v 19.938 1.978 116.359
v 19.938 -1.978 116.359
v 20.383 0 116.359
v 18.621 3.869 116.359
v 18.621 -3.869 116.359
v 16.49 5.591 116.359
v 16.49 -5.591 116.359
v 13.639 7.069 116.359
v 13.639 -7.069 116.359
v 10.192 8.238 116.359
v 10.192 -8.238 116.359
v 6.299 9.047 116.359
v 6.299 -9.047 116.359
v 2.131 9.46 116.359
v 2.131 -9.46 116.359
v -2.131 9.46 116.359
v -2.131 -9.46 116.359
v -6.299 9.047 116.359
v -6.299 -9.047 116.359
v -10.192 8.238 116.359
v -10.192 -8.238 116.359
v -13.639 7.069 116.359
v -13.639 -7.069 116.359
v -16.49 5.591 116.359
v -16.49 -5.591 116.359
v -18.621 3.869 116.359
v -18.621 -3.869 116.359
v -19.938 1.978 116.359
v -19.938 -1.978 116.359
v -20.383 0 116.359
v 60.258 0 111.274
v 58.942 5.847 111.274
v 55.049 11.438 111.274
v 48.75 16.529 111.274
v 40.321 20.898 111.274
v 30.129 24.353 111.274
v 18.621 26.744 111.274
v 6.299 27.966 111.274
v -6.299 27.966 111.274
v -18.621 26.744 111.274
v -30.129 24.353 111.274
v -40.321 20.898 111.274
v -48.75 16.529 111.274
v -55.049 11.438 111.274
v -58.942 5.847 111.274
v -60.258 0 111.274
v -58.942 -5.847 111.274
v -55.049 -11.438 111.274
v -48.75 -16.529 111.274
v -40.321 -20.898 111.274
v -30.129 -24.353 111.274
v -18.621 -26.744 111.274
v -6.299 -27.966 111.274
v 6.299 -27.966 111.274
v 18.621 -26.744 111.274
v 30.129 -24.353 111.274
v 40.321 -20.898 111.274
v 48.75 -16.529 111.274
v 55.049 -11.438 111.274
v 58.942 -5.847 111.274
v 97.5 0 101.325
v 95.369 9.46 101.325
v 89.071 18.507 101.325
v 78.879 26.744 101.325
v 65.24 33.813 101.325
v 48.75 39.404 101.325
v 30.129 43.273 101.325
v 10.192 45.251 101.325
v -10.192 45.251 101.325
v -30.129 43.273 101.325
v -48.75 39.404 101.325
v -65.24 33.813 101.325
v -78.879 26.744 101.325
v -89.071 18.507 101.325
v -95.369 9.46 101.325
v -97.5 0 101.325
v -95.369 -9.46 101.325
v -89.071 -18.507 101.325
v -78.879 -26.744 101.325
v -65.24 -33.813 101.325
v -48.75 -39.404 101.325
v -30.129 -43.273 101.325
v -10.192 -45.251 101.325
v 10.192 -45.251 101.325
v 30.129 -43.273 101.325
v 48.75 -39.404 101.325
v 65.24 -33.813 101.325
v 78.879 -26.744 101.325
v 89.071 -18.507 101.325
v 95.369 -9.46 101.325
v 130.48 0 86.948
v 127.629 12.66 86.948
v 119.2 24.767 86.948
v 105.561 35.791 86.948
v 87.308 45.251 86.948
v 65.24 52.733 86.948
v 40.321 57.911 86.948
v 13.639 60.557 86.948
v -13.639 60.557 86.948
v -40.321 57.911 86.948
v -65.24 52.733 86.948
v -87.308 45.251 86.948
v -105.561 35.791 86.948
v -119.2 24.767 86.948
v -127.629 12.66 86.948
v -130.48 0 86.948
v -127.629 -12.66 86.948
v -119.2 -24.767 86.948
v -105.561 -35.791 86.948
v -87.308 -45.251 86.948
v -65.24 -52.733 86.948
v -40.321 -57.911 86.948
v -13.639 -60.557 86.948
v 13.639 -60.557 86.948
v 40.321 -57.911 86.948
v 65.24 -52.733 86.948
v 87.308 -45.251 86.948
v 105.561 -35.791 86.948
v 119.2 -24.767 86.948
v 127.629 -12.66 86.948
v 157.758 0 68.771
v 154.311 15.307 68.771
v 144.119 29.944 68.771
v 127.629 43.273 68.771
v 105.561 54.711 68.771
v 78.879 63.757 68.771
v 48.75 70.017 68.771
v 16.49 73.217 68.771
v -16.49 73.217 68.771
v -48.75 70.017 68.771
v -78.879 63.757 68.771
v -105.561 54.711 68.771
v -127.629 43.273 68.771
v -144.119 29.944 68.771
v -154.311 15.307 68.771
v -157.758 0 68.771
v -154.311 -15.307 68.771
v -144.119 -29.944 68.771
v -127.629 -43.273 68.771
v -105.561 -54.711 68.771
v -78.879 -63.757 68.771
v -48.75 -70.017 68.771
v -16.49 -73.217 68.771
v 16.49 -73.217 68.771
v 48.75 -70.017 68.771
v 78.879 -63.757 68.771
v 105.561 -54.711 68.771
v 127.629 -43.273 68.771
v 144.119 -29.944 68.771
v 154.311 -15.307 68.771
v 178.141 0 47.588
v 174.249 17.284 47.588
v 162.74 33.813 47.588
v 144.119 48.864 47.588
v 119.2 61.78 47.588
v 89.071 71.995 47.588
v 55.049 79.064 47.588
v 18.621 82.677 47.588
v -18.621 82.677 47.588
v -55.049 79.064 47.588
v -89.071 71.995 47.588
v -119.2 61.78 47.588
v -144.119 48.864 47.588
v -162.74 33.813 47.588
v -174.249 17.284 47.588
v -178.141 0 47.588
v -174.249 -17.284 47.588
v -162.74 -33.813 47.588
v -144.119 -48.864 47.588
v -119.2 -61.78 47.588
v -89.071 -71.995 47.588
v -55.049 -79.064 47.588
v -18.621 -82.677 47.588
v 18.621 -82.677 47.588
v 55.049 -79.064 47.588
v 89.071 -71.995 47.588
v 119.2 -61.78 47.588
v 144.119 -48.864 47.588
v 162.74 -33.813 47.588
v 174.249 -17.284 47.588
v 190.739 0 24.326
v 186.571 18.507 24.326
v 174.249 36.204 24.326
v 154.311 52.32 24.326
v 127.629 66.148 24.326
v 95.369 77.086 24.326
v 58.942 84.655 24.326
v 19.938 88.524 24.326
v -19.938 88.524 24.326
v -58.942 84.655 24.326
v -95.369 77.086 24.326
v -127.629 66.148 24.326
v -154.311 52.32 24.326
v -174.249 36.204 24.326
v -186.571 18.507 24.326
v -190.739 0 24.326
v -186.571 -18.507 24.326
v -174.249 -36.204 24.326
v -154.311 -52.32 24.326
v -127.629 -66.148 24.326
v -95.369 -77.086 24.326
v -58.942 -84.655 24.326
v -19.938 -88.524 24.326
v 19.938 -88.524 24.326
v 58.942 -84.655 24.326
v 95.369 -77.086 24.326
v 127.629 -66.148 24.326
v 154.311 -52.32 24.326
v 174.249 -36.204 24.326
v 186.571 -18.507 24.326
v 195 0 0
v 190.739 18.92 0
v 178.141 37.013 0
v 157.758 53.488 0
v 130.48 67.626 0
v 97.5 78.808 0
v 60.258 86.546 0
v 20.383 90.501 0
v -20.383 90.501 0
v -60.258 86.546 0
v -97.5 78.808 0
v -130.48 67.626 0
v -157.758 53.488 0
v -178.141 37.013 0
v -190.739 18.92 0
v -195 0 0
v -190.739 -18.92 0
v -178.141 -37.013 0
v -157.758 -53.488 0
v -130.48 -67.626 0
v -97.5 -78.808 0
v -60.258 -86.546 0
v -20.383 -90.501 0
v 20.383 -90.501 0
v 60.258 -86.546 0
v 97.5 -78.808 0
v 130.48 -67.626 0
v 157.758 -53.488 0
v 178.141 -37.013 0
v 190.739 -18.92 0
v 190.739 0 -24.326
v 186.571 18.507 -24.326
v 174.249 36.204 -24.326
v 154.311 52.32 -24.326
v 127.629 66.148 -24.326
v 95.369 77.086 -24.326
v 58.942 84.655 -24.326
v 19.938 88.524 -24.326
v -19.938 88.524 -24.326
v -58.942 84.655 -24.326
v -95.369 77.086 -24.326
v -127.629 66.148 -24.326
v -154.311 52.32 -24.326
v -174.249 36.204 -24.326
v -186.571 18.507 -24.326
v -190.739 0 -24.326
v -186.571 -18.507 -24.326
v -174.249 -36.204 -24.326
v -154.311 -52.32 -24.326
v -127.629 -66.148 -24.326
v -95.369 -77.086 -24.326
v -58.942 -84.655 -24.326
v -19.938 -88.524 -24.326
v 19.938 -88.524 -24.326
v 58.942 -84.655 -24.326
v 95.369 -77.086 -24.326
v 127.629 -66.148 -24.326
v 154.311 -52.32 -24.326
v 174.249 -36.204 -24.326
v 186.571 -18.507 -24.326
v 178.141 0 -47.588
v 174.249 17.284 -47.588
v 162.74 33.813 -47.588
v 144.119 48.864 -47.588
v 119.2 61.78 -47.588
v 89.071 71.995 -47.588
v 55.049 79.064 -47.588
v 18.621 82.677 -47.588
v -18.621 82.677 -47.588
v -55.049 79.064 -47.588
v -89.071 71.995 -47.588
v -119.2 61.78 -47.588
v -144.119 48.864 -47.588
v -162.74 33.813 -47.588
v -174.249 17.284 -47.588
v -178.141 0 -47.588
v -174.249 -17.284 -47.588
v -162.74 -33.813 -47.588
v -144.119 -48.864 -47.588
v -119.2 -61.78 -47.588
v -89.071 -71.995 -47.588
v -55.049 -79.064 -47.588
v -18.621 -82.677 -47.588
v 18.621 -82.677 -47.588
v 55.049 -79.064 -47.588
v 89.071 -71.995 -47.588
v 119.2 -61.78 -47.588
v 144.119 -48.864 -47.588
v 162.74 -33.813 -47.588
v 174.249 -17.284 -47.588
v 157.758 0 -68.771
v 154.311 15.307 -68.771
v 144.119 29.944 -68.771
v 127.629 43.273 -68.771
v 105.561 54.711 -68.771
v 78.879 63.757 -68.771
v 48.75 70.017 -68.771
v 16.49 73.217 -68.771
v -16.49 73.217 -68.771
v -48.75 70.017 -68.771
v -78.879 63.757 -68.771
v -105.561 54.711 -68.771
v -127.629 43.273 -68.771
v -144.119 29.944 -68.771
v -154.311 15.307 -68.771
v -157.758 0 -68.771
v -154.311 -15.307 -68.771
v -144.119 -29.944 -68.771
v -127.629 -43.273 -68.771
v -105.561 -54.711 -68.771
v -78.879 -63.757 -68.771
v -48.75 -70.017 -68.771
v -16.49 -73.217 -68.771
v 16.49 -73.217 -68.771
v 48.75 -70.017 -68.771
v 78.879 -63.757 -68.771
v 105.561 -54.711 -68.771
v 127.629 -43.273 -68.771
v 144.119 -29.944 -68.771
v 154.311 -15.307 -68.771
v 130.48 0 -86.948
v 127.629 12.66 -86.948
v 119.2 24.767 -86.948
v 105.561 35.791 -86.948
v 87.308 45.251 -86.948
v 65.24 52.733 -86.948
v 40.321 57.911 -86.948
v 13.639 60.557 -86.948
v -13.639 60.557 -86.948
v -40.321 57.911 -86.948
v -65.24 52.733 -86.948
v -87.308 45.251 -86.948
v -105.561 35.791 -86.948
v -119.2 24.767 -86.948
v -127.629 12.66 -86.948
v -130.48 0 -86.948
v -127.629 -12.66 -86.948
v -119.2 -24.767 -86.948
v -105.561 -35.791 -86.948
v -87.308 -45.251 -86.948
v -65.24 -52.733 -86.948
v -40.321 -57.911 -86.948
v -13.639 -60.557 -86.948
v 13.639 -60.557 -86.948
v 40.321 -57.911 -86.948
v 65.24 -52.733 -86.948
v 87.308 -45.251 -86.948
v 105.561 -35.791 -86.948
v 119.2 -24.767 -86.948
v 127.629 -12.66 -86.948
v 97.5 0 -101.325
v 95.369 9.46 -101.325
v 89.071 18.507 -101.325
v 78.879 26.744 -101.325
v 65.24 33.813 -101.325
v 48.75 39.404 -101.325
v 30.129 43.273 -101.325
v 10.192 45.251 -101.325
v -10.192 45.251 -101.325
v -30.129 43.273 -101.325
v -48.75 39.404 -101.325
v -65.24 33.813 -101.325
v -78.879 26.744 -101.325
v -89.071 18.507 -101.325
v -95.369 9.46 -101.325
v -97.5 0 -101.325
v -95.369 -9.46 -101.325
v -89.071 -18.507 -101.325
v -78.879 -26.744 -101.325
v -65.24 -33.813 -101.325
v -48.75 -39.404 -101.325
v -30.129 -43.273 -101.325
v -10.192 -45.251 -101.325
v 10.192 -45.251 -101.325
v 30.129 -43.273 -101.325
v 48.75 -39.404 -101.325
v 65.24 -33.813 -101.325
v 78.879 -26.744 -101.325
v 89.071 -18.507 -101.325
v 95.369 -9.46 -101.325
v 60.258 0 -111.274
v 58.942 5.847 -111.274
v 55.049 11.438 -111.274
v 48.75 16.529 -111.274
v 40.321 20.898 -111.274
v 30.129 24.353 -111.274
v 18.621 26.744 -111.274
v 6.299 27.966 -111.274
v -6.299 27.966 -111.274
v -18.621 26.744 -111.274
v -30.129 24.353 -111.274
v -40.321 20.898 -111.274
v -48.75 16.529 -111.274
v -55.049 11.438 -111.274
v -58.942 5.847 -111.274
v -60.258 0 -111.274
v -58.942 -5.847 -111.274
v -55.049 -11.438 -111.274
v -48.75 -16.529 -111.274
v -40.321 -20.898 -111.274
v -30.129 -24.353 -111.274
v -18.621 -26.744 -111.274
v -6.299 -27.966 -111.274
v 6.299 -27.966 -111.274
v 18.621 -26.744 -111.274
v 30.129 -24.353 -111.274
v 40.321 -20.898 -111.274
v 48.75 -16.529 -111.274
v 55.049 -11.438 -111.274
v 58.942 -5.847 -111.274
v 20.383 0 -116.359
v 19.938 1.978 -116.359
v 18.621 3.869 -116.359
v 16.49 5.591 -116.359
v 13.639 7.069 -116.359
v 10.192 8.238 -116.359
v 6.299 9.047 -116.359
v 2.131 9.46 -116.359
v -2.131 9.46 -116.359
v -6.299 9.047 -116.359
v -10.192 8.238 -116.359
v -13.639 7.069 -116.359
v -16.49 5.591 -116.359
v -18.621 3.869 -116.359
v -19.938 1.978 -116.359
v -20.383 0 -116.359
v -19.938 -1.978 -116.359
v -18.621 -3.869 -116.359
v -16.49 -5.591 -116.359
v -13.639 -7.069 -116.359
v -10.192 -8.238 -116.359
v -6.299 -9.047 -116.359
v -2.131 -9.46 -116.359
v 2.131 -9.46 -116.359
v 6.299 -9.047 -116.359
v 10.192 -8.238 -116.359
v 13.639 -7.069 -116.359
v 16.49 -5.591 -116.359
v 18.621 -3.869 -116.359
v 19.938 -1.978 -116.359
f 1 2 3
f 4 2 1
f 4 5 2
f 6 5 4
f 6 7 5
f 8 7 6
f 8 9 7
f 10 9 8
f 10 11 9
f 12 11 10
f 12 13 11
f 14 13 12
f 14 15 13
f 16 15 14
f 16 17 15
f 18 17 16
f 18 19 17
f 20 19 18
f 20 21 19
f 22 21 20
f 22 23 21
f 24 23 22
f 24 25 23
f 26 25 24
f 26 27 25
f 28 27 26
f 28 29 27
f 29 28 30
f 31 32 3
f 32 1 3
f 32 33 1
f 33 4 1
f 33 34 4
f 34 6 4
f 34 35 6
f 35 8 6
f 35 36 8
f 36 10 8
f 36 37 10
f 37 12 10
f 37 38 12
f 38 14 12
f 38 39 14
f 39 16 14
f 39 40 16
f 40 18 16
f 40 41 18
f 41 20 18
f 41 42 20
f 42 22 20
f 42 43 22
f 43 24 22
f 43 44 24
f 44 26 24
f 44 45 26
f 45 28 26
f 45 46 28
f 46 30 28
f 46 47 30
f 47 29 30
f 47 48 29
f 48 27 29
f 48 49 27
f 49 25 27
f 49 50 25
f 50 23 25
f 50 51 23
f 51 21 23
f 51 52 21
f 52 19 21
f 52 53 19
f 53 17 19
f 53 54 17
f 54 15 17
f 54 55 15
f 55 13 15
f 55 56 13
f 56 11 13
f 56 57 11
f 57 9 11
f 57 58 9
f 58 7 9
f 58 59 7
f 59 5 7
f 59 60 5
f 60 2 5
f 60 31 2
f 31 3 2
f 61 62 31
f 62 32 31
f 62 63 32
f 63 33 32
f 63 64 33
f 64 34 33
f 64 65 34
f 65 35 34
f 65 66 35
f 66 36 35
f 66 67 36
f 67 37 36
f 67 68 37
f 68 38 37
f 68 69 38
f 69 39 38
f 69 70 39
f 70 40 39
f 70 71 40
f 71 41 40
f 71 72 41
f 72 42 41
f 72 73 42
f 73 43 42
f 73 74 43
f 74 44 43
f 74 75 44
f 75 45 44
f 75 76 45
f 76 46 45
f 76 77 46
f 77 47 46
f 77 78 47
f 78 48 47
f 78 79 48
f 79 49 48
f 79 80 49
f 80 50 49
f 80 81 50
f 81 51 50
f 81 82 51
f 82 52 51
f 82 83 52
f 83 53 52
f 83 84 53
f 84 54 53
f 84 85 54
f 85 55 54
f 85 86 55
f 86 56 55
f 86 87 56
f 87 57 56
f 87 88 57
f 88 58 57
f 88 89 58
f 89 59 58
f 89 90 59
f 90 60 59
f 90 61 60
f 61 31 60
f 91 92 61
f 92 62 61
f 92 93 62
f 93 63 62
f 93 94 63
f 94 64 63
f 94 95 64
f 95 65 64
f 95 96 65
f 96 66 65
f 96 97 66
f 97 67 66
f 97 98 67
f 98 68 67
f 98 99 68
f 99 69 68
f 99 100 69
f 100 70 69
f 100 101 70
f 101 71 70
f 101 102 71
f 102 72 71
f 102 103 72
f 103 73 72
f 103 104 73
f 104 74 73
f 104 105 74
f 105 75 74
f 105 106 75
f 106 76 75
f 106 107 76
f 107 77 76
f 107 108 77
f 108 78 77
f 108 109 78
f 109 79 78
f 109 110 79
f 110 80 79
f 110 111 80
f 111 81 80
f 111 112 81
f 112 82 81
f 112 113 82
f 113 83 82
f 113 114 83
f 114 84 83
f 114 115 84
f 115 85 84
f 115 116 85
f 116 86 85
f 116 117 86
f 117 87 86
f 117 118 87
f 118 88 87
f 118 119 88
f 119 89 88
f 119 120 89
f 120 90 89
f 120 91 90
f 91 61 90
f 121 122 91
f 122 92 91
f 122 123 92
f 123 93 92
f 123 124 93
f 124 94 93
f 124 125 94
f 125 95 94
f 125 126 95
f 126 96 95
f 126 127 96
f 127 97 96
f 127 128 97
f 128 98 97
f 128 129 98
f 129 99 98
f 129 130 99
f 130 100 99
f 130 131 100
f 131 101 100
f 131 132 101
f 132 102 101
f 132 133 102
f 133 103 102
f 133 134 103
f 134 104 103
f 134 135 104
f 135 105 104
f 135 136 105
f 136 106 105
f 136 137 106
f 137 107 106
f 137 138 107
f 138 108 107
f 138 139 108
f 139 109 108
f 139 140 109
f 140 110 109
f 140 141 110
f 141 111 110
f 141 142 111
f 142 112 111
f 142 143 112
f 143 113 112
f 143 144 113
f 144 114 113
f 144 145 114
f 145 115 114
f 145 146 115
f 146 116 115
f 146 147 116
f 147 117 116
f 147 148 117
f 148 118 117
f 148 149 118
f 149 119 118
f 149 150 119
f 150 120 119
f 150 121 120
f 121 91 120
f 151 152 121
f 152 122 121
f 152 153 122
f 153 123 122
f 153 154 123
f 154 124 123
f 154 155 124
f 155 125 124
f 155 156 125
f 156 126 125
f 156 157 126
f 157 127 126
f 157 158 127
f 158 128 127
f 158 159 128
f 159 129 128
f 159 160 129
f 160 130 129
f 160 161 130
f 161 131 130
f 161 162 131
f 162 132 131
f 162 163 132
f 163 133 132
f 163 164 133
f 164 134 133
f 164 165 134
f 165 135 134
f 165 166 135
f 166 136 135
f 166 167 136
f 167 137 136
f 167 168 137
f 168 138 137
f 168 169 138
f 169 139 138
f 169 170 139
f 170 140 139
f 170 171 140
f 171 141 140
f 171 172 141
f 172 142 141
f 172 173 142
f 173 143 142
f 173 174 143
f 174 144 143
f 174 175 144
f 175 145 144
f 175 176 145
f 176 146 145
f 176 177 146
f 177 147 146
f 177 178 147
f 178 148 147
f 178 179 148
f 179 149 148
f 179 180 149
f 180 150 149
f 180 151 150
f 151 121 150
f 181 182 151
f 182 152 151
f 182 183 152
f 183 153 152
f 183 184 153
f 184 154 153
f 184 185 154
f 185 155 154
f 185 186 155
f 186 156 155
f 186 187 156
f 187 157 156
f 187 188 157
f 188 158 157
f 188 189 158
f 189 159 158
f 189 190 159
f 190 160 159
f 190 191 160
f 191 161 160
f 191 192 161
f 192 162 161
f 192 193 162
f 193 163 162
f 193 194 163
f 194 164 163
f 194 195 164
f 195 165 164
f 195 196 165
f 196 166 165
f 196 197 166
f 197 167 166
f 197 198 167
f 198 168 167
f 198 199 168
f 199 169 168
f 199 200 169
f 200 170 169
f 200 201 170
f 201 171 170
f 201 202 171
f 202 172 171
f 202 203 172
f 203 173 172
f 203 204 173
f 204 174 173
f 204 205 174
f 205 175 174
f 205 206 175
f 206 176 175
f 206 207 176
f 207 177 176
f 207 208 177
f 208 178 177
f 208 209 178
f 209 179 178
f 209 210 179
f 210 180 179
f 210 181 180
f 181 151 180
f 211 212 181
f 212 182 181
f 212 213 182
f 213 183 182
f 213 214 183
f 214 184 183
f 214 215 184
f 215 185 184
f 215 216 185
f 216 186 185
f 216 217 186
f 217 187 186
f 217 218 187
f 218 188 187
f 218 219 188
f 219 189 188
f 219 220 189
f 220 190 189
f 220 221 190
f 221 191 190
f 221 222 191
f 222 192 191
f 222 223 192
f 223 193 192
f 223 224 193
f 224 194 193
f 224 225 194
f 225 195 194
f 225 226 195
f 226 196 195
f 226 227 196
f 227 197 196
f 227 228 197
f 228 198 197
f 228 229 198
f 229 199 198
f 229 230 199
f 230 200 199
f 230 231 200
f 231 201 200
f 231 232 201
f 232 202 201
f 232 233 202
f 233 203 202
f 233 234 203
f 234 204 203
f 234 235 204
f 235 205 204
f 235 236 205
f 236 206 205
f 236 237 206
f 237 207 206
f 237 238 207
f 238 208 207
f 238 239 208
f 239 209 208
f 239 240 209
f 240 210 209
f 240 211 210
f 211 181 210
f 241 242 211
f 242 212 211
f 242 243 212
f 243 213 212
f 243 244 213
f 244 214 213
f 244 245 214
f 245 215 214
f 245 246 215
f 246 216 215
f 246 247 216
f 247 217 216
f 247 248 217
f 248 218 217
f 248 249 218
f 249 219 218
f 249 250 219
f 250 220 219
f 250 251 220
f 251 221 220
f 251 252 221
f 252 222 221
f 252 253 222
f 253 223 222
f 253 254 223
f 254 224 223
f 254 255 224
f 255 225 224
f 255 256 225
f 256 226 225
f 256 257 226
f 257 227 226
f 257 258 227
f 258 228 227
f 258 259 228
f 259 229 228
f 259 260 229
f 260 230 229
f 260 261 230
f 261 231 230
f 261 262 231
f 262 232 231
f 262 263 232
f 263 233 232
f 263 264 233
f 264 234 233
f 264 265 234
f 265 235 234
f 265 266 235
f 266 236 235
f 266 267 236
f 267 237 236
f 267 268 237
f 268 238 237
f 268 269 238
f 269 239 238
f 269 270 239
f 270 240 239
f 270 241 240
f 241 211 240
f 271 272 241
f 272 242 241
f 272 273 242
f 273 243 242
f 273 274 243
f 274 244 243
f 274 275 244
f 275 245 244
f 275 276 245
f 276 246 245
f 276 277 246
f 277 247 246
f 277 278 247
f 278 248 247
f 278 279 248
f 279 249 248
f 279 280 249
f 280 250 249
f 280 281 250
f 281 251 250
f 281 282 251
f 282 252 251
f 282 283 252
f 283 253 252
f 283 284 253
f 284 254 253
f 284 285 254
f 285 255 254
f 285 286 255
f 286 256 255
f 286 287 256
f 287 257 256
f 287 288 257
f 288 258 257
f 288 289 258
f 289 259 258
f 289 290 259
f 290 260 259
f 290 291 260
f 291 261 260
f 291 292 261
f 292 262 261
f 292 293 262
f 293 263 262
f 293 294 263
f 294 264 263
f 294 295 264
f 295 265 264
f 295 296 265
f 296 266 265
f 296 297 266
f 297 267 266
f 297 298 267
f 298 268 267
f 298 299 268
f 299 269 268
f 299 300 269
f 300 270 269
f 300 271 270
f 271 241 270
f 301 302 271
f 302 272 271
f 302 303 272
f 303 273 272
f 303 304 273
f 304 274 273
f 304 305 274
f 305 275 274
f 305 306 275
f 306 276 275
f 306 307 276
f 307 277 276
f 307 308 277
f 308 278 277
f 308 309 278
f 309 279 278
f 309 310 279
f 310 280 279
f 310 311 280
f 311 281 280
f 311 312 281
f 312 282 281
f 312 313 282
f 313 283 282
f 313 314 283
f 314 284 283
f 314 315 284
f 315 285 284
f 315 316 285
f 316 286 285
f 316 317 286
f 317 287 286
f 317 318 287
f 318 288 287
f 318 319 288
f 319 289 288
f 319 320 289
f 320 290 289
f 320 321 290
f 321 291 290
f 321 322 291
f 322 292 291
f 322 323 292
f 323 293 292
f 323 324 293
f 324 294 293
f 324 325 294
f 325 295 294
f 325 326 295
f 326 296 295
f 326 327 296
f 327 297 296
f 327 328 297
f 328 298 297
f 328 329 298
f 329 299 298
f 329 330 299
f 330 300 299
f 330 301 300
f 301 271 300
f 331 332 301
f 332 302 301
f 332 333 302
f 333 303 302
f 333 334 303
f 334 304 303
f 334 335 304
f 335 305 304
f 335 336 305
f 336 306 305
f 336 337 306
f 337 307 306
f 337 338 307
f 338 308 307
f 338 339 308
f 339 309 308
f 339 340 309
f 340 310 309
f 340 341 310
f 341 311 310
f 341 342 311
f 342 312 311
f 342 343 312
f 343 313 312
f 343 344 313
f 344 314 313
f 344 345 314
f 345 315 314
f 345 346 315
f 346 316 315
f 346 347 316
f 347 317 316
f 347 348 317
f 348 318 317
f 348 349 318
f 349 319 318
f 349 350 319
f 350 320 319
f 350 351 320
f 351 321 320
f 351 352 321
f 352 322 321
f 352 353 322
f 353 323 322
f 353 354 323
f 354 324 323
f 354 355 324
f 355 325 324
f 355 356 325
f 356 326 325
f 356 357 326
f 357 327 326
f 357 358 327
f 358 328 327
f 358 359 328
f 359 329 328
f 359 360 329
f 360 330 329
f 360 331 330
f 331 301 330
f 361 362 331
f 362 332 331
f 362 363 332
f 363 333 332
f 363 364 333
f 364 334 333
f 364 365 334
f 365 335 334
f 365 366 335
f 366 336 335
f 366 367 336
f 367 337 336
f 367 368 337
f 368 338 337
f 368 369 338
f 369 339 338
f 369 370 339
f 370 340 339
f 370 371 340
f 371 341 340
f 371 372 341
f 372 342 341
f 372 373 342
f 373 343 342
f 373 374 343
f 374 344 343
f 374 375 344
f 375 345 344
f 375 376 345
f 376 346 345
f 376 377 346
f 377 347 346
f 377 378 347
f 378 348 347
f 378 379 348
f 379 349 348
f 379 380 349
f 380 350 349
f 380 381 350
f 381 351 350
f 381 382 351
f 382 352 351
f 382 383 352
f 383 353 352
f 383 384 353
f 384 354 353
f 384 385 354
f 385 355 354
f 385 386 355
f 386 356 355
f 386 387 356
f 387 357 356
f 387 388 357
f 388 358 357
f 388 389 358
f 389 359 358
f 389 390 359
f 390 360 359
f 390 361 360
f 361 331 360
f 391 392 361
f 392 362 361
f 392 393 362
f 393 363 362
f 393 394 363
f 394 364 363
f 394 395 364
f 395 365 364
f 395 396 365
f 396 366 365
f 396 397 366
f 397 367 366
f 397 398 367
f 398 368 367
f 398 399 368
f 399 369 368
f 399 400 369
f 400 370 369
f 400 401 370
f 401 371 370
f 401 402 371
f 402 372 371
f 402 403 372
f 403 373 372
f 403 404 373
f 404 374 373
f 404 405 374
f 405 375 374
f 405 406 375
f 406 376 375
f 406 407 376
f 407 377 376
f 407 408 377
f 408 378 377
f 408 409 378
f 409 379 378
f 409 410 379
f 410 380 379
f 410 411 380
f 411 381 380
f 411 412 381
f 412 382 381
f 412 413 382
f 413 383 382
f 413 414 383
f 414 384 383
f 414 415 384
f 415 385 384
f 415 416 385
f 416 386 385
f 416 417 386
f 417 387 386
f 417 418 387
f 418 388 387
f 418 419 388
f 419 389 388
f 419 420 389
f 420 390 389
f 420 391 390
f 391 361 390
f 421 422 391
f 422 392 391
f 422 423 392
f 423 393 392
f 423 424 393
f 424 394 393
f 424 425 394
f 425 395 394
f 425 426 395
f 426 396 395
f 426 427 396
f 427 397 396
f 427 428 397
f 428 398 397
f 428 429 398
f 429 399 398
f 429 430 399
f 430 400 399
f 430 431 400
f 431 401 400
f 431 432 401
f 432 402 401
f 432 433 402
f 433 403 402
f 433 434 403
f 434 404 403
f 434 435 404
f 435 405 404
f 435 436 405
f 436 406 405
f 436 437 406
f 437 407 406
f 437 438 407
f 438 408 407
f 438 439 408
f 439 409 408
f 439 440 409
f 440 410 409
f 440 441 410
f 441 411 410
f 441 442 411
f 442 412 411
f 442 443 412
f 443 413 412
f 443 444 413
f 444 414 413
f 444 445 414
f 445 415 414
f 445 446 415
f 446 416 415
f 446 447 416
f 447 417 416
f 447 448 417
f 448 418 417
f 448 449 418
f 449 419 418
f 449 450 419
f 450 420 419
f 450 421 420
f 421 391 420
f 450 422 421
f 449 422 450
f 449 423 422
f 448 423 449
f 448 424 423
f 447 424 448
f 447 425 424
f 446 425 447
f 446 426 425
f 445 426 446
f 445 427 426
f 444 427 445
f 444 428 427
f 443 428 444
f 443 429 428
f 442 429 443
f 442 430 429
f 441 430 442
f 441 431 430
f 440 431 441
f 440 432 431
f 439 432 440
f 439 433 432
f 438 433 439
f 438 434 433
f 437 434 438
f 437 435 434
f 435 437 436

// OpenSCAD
// Generated by SolidPython 1.0.1 on 2020-07-29 00:46:51


scale(v = [15, 7, 9]) {
	sphere(r = 13);
}
/***********************************************
*********      SolidPython code:      **********
************************************************
 
# import packages: SolidPython
from solid import *
from solid.utils import *
from itertools import chain, combinations, permutations


class Resize:

    def __init__(self, scad_file):
        self.scad_file = scad_file
        #self.scad_file = import_scad(scad_file)
        # cone/cylinder param:
        self.r1 = 0
        self.r2 = 0
        self.h = 0
        # rectangular prism param:
        self.w = 0
        self.l = 0
        # ellipse param:
        self.r = 0

    # import OpenScad code (file name corresponds to shape)


    # classify shape + parameters
    def assign(self, param1, param2, param3):
        if self.scad_file == 'cone.scad':
            self.r1 = param1
            self.r2 = param2
            self.h = param3
        elif self.scad_file == 'cylinder.scad':
            self.r1 = param1
            self.r2 = param2
            self.h = param3
        elif self.scad_file == 'rectangularPrism.scad':
            self.h = param1
            self.l = param2
            self.w = param3
        else:
            self.r = param1
            self.h = param2

    # resize parameters
    def iterate(self):
        x = range(3, 20, 2)
        i = 1
        if self.scad_file == 'cone.scad':
            tempList = list(permutations(x, 2))
            for temp in tempList:
                param1 = temp[0]
                param2 = temp[1]
                filepath = 'produced_scad_files/' + 'cone' + str(param1) + '_' + str(param2) + '_' + '.scad'
                scad_render_to_file(cylinder(h=param1, r1=param2, r2=0), filepath)

        elif self.scad_file == 'cylinder.scad':
            tempList = list(permutations(x, 3))
            for temp in tempList:
                param1 = temp[0]
                param2 = temp[1]
                filepath = 'produced_scad_files/' + 'cylinder' + str(param1) + '_' + str(param2) + '_' + '.scad'
                scad_render_to_file(cylinder(h=param1, r1=param2, r2=param2), filepath)

        elif self.scad_file == 'rectangularPrism.scad':
            tempList = list(permutations(x, 3))
            for temp in tempList:
                param1 = temp[0]
                param2 = temp[1]
                param3 = temp[2]
                filepath = 'produced_scad_files/' + 'rectangularPrism' + str(param1) + '_' + str(param2) + '_' + str(
                    param3) + '.scad'
                scad_render_to_file(cube(size=(param1, param2, param3)), filepath)

        elif self.scad_file == 'ellipse.scad':
            tempList = list(permutations(x, 4))
            for temp in tempList:
                param1 = temp[0]
                param2 = temp[1]
                param3 = temp[2]
                param4 = temp[3]
                filepath = 'produced_scad_files/' + 'ellipse' + str(param1) + '_' + str(param2) + '_' + str(param3) + '_' + str(param4) + '.scad'
                scad_render_to_file(scale([param1, param2, param3])(sphere(r=param4)), filepath)

    def render_to_scadfile(self):
        scad_render_to_file(scad, 'example.scad') 
 
************************************************/
